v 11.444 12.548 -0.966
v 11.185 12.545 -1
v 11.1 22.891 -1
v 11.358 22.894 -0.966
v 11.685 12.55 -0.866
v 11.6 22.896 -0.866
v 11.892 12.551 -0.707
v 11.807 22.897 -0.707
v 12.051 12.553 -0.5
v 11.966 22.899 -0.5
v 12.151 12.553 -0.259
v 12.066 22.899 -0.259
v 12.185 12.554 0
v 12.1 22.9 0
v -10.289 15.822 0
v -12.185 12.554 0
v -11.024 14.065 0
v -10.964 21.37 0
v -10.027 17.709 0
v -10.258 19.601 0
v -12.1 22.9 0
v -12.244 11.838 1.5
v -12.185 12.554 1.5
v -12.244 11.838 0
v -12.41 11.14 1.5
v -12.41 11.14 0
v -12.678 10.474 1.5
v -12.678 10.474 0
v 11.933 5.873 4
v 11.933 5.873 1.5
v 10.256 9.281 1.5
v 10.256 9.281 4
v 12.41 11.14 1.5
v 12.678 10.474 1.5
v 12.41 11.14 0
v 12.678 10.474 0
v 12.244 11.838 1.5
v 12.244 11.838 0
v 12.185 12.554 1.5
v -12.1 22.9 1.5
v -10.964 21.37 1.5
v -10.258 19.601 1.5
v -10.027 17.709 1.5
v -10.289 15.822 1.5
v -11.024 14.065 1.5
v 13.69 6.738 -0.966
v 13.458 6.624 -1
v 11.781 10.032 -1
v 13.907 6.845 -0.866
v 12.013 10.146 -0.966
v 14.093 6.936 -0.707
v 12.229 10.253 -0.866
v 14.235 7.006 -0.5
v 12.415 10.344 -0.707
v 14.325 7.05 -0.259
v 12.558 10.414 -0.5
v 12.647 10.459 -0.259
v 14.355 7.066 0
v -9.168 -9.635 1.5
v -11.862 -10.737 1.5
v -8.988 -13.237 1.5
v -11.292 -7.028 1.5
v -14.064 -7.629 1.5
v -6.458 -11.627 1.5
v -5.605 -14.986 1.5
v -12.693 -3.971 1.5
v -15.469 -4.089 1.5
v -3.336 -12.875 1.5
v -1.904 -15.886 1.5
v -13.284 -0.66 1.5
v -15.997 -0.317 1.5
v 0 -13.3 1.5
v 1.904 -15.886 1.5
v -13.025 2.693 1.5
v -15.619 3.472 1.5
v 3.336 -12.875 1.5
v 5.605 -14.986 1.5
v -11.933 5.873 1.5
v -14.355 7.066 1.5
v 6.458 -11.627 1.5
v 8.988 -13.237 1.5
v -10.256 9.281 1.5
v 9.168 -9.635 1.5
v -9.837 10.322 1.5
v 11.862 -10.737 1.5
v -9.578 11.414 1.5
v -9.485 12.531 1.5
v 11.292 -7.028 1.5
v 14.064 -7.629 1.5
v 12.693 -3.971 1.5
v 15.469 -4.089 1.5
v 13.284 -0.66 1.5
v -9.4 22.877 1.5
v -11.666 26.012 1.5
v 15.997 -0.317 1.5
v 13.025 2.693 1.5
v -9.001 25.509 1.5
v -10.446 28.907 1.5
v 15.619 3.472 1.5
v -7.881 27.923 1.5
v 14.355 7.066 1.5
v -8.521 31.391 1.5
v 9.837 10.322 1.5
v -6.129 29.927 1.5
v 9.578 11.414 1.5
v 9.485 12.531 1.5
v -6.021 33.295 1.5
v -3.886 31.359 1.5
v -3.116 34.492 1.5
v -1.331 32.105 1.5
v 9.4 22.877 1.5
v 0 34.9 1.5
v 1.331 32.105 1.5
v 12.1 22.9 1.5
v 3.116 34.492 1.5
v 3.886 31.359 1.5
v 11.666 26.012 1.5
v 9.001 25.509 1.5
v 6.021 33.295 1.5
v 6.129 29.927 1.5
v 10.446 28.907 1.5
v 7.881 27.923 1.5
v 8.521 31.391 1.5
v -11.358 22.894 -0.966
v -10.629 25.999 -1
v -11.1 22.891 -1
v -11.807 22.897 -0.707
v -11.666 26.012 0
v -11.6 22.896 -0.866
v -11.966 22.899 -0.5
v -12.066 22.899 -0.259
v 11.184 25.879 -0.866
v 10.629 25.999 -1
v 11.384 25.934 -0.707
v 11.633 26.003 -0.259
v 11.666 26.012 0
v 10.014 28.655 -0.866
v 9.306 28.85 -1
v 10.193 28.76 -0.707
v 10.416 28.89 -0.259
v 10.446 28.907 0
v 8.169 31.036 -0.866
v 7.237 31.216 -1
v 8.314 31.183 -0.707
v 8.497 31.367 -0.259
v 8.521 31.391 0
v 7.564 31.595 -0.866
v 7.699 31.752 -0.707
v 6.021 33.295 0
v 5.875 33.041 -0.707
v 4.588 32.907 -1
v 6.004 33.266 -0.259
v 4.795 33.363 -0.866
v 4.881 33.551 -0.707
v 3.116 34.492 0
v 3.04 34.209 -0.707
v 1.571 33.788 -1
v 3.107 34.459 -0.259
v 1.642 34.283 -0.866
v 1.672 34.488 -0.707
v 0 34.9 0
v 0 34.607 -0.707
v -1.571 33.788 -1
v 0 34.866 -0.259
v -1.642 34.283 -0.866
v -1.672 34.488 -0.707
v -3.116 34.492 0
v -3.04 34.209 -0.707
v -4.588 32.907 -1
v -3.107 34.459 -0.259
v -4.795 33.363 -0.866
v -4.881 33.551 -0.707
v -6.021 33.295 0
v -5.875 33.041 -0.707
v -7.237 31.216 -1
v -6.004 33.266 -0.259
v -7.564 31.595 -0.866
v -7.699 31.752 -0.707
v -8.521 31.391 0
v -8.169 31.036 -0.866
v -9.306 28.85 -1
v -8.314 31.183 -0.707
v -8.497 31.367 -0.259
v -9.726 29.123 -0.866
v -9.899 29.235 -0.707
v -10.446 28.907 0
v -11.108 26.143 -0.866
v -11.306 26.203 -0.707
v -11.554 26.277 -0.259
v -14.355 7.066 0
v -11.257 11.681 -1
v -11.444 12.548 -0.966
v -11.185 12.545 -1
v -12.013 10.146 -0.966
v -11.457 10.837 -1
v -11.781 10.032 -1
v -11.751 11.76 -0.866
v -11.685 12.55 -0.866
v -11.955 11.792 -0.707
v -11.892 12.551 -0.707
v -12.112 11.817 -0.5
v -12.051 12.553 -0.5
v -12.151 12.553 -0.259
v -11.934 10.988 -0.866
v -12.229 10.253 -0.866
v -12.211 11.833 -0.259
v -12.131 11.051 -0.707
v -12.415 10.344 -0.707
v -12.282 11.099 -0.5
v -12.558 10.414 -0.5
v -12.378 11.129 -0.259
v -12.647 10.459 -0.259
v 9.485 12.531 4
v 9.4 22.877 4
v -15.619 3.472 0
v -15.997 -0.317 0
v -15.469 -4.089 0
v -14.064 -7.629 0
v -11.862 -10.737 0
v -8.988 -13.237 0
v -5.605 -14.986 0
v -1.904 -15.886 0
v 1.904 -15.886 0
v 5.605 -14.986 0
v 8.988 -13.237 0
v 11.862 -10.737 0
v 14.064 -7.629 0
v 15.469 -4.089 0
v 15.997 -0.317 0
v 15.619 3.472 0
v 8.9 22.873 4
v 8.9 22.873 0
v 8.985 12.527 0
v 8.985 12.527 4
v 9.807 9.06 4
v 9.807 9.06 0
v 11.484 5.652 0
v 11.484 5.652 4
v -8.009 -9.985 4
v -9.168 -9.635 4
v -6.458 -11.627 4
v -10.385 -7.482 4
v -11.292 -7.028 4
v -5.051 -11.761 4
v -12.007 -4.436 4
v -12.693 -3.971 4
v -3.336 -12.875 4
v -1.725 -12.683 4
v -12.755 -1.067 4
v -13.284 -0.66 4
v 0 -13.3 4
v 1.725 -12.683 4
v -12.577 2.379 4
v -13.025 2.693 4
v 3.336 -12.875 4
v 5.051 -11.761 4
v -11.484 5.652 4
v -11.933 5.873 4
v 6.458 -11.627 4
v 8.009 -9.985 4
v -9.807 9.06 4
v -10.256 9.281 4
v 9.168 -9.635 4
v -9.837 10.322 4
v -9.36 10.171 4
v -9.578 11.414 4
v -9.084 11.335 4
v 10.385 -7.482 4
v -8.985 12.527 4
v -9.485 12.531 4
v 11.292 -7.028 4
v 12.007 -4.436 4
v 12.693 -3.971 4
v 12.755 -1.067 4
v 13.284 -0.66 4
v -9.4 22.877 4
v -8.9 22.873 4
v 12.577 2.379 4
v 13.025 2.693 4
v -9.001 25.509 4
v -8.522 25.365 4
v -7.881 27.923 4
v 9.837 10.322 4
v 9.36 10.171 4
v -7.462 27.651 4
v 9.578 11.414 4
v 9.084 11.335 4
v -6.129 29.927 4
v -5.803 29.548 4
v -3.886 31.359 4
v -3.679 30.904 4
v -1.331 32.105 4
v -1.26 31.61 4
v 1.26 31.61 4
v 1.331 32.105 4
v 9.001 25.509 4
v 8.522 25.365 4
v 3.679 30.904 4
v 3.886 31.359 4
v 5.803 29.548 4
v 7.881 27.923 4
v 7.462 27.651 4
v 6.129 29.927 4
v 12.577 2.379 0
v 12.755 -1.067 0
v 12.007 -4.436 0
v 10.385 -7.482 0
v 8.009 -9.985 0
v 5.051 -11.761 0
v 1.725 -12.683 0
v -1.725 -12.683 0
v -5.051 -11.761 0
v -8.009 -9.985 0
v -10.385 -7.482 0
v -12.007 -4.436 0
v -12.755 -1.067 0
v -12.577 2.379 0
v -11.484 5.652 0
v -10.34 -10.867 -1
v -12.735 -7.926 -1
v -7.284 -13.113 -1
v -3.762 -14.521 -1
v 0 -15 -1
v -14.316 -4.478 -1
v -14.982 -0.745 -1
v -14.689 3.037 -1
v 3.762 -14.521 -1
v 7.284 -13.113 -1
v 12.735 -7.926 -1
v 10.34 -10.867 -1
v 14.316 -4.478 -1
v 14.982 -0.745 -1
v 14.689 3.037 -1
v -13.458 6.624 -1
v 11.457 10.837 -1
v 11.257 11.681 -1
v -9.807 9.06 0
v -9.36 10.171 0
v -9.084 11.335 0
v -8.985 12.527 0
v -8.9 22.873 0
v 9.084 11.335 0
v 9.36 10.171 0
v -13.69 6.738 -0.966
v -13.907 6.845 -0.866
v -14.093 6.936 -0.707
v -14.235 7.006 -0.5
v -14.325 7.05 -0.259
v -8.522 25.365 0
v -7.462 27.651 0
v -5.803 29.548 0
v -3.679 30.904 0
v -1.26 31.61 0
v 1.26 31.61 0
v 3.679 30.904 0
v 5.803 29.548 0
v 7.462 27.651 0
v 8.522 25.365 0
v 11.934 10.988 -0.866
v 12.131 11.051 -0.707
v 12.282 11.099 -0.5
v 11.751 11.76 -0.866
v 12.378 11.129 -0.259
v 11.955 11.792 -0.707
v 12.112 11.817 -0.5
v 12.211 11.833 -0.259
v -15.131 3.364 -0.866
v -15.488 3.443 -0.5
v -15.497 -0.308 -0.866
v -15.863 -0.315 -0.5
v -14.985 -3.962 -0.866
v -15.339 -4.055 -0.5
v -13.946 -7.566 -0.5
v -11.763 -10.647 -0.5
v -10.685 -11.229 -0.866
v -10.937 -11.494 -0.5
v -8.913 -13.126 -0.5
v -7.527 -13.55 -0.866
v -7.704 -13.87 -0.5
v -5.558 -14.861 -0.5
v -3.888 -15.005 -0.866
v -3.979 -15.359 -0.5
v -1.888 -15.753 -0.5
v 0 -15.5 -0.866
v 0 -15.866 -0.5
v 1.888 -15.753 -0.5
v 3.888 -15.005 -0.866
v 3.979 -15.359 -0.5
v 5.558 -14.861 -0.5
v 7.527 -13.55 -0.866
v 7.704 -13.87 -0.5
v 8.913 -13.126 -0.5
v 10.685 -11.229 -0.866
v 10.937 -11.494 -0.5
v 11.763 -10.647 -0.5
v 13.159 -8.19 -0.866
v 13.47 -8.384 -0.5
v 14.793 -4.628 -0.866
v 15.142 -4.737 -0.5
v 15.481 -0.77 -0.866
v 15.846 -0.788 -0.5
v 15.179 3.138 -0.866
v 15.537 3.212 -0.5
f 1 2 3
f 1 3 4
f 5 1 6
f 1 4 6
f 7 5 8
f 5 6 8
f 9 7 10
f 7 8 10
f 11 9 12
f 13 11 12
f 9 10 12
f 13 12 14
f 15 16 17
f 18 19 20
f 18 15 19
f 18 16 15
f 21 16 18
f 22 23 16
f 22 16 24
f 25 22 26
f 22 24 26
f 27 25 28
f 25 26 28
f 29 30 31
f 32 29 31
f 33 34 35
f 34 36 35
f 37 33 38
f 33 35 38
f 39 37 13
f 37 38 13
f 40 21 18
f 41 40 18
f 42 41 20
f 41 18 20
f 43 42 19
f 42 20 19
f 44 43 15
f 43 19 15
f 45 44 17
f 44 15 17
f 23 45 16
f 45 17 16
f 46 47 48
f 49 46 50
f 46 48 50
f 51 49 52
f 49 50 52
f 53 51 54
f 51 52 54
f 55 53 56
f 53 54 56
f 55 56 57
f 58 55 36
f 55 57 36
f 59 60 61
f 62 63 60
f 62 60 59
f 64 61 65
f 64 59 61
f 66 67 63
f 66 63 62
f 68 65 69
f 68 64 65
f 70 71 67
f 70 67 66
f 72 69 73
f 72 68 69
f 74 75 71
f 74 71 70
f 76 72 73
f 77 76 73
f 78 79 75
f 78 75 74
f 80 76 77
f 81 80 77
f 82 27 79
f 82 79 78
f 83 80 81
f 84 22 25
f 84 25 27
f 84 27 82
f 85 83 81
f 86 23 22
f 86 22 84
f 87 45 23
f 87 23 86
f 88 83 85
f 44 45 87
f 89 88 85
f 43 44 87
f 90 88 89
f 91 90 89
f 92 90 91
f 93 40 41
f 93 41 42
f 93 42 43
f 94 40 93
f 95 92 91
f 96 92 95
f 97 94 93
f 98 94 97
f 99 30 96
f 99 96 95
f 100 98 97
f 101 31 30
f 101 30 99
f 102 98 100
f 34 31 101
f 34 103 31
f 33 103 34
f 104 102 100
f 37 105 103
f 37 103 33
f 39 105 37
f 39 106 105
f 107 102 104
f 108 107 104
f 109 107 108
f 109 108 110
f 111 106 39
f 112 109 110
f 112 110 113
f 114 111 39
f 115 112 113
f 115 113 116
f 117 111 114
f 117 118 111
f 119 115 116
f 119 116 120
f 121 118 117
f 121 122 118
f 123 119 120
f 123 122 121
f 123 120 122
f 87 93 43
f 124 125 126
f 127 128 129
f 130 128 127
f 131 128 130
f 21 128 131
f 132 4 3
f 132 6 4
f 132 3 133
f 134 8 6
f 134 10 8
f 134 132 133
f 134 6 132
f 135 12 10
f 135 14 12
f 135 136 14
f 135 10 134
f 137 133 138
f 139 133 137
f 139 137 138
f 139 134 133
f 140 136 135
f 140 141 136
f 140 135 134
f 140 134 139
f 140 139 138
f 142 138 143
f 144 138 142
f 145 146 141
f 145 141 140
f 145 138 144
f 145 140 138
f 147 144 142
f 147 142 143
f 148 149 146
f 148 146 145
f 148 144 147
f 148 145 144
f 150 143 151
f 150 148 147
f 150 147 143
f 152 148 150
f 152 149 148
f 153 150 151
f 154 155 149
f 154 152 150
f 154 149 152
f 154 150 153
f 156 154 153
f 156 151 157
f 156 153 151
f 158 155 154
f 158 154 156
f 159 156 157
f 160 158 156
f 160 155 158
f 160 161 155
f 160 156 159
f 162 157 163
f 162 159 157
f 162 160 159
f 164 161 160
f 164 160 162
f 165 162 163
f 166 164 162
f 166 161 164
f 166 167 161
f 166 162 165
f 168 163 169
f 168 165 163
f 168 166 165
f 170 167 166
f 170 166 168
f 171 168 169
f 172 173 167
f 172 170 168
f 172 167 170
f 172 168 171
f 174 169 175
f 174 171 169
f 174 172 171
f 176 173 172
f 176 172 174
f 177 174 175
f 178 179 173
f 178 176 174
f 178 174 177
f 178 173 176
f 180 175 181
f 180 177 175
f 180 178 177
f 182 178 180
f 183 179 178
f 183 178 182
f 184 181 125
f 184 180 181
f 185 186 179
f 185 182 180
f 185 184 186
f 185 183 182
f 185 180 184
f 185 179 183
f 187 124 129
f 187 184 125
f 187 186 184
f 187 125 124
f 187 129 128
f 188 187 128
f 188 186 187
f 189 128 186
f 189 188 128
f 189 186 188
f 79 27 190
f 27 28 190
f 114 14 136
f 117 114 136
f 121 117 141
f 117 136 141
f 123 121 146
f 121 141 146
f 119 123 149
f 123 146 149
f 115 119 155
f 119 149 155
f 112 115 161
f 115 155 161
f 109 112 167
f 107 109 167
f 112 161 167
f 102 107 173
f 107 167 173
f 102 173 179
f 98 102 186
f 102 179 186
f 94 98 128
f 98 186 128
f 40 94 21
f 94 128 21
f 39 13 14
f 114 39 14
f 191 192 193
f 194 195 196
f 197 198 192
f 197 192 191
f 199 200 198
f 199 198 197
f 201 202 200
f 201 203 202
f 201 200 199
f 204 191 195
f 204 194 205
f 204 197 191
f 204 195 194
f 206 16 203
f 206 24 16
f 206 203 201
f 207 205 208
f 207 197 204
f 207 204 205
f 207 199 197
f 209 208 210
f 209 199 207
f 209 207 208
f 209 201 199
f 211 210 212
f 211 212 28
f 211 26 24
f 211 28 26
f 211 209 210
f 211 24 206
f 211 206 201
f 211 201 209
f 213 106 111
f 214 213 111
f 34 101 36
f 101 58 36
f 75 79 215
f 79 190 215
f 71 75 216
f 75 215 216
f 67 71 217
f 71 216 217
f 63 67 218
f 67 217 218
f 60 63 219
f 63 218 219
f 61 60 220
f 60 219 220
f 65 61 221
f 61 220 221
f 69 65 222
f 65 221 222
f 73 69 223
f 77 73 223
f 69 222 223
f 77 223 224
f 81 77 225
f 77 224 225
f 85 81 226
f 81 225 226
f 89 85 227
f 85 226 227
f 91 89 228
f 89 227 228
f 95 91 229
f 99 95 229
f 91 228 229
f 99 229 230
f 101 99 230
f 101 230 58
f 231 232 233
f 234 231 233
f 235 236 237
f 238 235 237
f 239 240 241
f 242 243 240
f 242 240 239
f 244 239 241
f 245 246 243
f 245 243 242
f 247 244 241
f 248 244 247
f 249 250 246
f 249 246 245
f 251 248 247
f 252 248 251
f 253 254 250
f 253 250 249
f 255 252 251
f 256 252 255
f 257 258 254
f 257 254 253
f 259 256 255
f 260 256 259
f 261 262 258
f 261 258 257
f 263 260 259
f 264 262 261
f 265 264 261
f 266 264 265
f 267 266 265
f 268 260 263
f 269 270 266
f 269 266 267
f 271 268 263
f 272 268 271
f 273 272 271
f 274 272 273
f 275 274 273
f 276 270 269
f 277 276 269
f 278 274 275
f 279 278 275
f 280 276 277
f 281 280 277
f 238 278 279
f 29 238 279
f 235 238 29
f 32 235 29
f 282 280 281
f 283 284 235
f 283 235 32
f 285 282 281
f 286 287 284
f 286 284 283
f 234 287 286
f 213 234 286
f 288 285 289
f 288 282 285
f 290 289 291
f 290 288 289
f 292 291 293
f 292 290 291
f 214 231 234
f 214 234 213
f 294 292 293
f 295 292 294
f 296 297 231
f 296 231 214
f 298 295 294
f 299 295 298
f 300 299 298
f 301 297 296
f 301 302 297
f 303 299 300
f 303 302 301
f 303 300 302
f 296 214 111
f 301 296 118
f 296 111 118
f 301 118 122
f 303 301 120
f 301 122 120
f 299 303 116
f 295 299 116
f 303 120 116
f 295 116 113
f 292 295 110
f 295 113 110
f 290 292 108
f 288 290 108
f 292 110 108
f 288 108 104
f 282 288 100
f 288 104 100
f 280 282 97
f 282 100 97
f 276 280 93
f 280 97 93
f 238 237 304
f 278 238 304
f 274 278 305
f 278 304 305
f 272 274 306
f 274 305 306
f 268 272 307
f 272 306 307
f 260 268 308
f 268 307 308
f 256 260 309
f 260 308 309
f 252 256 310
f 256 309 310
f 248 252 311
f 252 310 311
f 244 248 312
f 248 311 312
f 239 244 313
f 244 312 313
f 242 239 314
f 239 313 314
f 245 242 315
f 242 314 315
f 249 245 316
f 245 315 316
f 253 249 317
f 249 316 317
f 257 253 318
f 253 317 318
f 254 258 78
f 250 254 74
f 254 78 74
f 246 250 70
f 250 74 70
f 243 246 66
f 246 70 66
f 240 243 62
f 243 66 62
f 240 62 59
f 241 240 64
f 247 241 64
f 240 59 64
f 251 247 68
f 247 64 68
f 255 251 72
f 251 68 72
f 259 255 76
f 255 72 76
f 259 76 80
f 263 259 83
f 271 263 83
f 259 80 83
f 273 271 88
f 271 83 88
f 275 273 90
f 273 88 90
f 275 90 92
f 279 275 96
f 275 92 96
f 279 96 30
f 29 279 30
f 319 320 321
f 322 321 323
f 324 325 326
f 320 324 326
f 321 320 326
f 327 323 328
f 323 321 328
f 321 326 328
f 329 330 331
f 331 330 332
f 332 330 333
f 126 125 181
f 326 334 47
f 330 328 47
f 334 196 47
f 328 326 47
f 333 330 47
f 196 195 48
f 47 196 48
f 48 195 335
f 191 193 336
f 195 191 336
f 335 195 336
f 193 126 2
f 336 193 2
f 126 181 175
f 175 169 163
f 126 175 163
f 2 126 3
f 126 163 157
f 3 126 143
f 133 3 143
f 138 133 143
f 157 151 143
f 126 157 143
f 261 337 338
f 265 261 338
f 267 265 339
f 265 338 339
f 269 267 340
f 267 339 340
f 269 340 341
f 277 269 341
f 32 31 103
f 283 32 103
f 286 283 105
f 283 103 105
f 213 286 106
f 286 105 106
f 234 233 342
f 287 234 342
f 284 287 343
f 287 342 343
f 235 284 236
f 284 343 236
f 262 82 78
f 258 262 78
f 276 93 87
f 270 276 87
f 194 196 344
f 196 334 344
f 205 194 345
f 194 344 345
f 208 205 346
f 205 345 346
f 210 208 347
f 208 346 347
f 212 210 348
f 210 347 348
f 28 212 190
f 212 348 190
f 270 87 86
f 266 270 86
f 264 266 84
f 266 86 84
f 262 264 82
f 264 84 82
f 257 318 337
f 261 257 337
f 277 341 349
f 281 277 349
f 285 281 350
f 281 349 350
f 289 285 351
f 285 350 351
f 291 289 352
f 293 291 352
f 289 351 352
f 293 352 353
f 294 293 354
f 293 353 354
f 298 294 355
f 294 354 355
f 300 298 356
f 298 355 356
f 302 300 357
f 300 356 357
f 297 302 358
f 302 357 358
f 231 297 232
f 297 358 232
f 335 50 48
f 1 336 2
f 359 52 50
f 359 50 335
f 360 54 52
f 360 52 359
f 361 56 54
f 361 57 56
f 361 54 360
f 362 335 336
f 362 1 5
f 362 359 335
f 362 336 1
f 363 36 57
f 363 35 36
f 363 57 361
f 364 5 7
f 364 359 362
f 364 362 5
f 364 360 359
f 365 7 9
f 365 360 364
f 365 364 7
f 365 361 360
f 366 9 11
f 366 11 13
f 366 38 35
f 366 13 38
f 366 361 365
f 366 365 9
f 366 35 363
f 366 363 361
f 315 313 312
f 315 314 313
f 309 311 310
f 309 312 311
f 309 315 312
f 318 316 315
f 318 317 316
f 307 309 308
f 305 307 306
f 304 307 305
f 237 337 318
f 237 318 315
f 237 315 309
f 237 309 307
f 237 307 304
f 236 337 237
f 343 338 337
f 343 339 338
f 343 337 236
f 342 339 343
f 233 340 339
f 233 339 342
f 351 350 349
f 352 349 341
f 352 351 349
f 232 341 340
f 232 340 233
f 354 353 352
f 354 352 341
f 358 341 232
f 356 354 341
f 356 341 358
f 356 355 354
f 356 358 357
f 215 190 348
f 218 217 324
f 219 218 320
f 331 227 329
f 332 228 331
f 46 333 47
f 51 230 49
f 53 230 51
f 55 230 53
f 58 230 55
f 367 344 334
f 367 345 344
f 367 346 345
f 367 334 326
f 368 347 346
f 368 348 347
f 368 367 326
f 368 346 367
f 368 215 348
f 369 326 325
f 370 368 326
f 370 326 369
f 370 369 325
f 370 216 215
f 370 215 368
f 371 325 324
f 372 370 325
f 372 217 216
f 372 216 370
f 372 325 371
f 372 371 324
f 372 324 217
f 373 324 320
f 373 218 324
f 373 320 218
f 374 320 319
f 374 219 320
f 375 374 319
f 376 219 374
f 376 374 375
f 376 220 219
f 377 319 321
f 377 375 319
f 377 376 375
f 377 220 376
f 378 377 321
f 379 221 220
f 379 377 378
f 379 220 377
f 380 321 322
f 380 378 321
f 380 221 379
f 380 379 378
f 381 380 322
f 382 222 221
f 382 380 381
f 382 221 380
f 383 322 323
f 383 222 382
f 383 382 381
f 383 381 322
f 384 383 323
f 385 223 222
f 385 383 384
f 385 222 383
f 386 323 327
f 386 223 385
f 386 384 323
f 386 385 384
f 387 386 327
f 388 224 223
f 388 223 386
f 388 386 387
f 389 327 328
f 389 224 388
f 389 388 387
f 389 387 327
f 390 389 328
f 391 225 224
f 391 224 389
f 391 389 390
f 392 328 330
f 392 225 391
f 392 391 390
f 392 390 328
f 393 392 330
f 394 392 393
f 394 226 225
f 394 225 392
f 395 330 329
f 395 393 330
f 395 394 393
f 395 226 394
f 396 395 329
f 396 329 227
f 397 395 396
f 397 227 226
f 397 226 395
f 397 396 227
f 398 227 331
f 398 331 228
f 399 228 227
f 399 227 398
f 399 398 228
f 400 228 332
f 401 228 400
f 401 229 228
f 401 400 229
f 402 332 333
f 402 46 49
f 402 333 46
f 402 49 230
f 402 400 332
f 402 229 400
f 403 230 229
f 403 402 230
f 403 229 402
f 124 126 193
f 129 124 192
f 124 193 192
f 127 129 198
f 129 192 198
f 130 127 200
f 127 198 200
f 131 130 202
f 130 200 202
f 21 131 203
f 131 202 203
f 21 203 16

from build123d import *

# Parameters (mm, degrees)
F2_DEPTH = 4
F4_DEPTH = 1
F5_R     = 0.99999
F7_DEPTH = 1.5


# Not quite as in the source:
# - a fillet or chamfer is up to 0.001 mm smaller than in the source, because OpenCascade refuses the exact size


with BuildPart() as f2:
    # F1 (on face) → F2 (new body)
    with BuildSketch(Plane.XY):
        with BuildLine():
            ThreePointArc((-9.4849269336, 12.5314274341), (-9.6870039278, 10.8628934269), (-10.2555653995, 9.2812554476))
            Line((-10.2555653995, 9.2812554476), (-11.9329496797, 5.8732198956))
            ThreePointArc((-11.9329496797, 5.8732198956), (0, -13.3), (11.9329496797, 5.8732198956))
            Line((11.9329496797, 5.8732198956), (10.2555653995, 9.2812554476))
            ThreePointArc((10.2555653995, 9.2812554476), (9.6870039278, 10.8628934269), (9.4849269336, 12.5314274341))
            Line((9.4849269336, 12.5314274341), (9.3996809366, 22.8774486305))
            ThreePointArc((9.3996809366, 22.8774486305), (0, 32.2), (-9.3996809366, 22.8774486305))
            Line((-9.3996809366, 22.8774486305), (-9.4849269336, 12.5314274341))
        make_face()
        with BuildLine():
            ThreePointArc((-9.8069582687, 9.0604577072), (-9.2004926988, 10.7475382184), (-8.9849439051, 12.5273078261))
            Line((-8.9849439051, 12.5273078261), (-8.899697908, 22.8733290225))
            ThreePointArc((-8.899697908, 22.8733290225), (0, 31.7), (8.899697908, 22.8733290225))
            Line((8.899697908, 22.8733290225), (8.9849439051, 12.5273078261))
            ThreePointArc((8.9849439051, 12.5273078261), (9.2004926988, 10.7475382184), (9.8069582687, 9.0604577072))
            Line((9.8069582687, 9.0604577072), (11.4843425489, 5.6524221551))
            ThreePointArc((11.4843425489, 5.6524221551), (0, -12.8), (-11.4843425489, 5.6524221551))
            Line((-11.4843425489, 5.6524221551), (-9.8069582687, 9.0604577072))
        make_face(mode=Mode.SUBTRACT)
    extrude(amount=F2_DEPTH)

    # F3 (on face) + F0 (on Top) → F4 (join)
    with BuildSketch(Plane.XY):
        with BuildLine():
            ThreePointArc((12.6780439059, 10.473563246), (12.314164564, 11.4858115527), (12.1848352877, 12.5536733173))
            Line((12.1848352877, 12.5536733173), (12.0995892907, 22.8996945138))
            ThreePointArc((12.0995892907, 22.8996945138), (0, 34.9), (-12.0995892907, 22.8996945138))
            Line((-12.0995892907, 22.8996945138), (-12.1848352877, 12.5536733173))
            ThreePointArc((-12.1848352877, 12.5536733173), (-12.314164564, 11.4858115527), (-12.6780439059, 10.473563246))
            Line((-12.6780439059, 10.473563246), (-14.3554281861, 7.0655276939))
            ThreePointArc((-14.3554281861, 7.0655276939), (0, -16), (14.3554281861, 7.0655276939))
            Line((14.3554281861, 7.0655276939), (12.6780439059, 10.473563246))
        make_face()
        with BuildLine():
            ThreePointArc((-8.899697908, 22.8733290225), (0, 31.7), (8.899697908, 22.8733290225))
            Line((8.899697908, 22.8733290225), (8.9849439051, 12.5273078261))
            ThreePointArc((8.9849439051, 12.5273078261), (9.2004926988, 10.7475382184), (9.8069582687, 9.0604577072))
            Line((9.8069582687, 9.0604577072), (11.4843425489, 5.6524221551))
            ThreePointArc((11.4843425489, 5.6524221551), (0, -12.8), (-11.4843425489, 5.6524221551))
            Line((-11.4843425489, 5.6524221551), (-9.8069582687, 9.0604577072))
            ThreePointArc((-9.8069582687, 9.0604577072), (-9.2004926988, 10.7475382184), (-8.9849439051, 12.5273078261))
            Line((-8.9849439051, 12.5273078261), (-8.899697908, 22.8733290225))
        make_face(mode=Mode.SUBTRACT)
    with BuildSketch(Plane.XY):
        with BuildLine():
            Line((-9.8069582687, 9.0604577072), (-11.4843425489, 5.6524221551))
            ThreePointArc((-11.4843425489, 5.6524221551), (0, -12.8), (11.4843425489, 5.6524221551))
            Line((11.4843425489, 5.6524221551), (9.8069582687, 9.0604577072))
            ThreePointArc((9.8069582687, 9.0604577072), (9.2004926988, 10.7475382184), (8.9849439051, 12.5273078261))
            Line((8.9849439051, 12.5273078261), (8.899697908, 22.8733290225))
            ThreePointArc((8.899697908, 22.8733290225), (0, 31.7), (-8.899697908, 22.8733290225))
            Line((-8.899697908, 22.8733290225), (-8.9849439051, 12.5273078261))
            ThreePointArc((-8.9849439051, 12.5273078261), (-9.2004926988, 10.7475382184), (-9.8069582687, 9.0604577072))
        make_face()
    extrude(amount=-F4_DEPTH)

    # F5 (radius 1 in the source; OpenCascade refuses exactly that, so slightly less here)
    f5_edges = [f2.edges().sort_by_distance(p)[0] for p in [
        (0, -16, -1),
        (-13.516736, 8.769545, -1),
        (-12.314165, 11.485812, -1),
        (-12.142212, 17.726684, -1),
        (0, 34.9, -1),
        (12.142212, 17.726684, -1),
        (12.314165, 11.485812, -1),
        (13.516736, 8.769545, -1),
    ]]
    fillet(f5_edges, radius=F5_R)

    # F6 (on face) → F7 (join)
    with BuildSketch(Plane.XY):
        with BuildLine():
            ThreePointArc((-12.1848352877, 12.5536733173), (-12.314164564, 11.4858115527), (-12.6780439059, 10.473563246))
            Line((-12.6780439059, 10.473563246), (-14.3554281861, 7.0655276939))
            ThreePointArc((-14.3554281861, 7.0655276939), (0, -16), (14.3554281861, 7.0655276939))
            Line((14.3554281861, 7.0655276939), (12.6780439059, 10.473563246))
            ThreePointArc((12.6780439059, 10.473563246), (12.314164564, 11.4858115527), (12.1848352877, 12.5536733173))
            Line((12.1848352877, 12.5536733173), (12.0995892907, 22.8996945138))
            ThreePointArc((12.0995892907, 22.8996945138), (0, 34.9), (-12.0995892907, 22.8996945138))
            ThreePointArc((-12.0995892907, 22.8996945138), (-10.0273713078, 17.7092586924), (-12.1848352877, 12.5536733173))
        make_face()
        with BuildLine():
            ThreePointArc((-10.2555653995, 9.2812554476), (-9.6870039278, 10.8628934269), (-9.4849269336, 12.5314274341))
            Line((-9.4849269336, 12.5314274341), (-9.3996809366, 22.8774486305))
            ThreePointArc((-9.3996809366, 22.8774486305), (0, 32.2), (9.3996809366, 22.8774486305))
            Line((9.3996809366, 22.8774486305), (9.4849269336, 12.5314274341))
            ThreePointArc((9.4849269336, 12.5314274341), (9.6870039278, 10.8628934269), (10.2555653995, 9.2812554476))
            Line((10.2555653995, 9.2812554476), (11.9329496797, 5.8732198956))
            ThreePointArc((11.9329496797, 5.8732198956), (0, -13.3), (-11.9329496797, 5.8732198956))
            Line((-11.9329496797, 5.8732198956), (-10.2555653995, 9.2812554476))
        make_face(mode=Mode.SUBTRACT)
    extrude(amount=F7_DEPTH)


solid = f2.part
